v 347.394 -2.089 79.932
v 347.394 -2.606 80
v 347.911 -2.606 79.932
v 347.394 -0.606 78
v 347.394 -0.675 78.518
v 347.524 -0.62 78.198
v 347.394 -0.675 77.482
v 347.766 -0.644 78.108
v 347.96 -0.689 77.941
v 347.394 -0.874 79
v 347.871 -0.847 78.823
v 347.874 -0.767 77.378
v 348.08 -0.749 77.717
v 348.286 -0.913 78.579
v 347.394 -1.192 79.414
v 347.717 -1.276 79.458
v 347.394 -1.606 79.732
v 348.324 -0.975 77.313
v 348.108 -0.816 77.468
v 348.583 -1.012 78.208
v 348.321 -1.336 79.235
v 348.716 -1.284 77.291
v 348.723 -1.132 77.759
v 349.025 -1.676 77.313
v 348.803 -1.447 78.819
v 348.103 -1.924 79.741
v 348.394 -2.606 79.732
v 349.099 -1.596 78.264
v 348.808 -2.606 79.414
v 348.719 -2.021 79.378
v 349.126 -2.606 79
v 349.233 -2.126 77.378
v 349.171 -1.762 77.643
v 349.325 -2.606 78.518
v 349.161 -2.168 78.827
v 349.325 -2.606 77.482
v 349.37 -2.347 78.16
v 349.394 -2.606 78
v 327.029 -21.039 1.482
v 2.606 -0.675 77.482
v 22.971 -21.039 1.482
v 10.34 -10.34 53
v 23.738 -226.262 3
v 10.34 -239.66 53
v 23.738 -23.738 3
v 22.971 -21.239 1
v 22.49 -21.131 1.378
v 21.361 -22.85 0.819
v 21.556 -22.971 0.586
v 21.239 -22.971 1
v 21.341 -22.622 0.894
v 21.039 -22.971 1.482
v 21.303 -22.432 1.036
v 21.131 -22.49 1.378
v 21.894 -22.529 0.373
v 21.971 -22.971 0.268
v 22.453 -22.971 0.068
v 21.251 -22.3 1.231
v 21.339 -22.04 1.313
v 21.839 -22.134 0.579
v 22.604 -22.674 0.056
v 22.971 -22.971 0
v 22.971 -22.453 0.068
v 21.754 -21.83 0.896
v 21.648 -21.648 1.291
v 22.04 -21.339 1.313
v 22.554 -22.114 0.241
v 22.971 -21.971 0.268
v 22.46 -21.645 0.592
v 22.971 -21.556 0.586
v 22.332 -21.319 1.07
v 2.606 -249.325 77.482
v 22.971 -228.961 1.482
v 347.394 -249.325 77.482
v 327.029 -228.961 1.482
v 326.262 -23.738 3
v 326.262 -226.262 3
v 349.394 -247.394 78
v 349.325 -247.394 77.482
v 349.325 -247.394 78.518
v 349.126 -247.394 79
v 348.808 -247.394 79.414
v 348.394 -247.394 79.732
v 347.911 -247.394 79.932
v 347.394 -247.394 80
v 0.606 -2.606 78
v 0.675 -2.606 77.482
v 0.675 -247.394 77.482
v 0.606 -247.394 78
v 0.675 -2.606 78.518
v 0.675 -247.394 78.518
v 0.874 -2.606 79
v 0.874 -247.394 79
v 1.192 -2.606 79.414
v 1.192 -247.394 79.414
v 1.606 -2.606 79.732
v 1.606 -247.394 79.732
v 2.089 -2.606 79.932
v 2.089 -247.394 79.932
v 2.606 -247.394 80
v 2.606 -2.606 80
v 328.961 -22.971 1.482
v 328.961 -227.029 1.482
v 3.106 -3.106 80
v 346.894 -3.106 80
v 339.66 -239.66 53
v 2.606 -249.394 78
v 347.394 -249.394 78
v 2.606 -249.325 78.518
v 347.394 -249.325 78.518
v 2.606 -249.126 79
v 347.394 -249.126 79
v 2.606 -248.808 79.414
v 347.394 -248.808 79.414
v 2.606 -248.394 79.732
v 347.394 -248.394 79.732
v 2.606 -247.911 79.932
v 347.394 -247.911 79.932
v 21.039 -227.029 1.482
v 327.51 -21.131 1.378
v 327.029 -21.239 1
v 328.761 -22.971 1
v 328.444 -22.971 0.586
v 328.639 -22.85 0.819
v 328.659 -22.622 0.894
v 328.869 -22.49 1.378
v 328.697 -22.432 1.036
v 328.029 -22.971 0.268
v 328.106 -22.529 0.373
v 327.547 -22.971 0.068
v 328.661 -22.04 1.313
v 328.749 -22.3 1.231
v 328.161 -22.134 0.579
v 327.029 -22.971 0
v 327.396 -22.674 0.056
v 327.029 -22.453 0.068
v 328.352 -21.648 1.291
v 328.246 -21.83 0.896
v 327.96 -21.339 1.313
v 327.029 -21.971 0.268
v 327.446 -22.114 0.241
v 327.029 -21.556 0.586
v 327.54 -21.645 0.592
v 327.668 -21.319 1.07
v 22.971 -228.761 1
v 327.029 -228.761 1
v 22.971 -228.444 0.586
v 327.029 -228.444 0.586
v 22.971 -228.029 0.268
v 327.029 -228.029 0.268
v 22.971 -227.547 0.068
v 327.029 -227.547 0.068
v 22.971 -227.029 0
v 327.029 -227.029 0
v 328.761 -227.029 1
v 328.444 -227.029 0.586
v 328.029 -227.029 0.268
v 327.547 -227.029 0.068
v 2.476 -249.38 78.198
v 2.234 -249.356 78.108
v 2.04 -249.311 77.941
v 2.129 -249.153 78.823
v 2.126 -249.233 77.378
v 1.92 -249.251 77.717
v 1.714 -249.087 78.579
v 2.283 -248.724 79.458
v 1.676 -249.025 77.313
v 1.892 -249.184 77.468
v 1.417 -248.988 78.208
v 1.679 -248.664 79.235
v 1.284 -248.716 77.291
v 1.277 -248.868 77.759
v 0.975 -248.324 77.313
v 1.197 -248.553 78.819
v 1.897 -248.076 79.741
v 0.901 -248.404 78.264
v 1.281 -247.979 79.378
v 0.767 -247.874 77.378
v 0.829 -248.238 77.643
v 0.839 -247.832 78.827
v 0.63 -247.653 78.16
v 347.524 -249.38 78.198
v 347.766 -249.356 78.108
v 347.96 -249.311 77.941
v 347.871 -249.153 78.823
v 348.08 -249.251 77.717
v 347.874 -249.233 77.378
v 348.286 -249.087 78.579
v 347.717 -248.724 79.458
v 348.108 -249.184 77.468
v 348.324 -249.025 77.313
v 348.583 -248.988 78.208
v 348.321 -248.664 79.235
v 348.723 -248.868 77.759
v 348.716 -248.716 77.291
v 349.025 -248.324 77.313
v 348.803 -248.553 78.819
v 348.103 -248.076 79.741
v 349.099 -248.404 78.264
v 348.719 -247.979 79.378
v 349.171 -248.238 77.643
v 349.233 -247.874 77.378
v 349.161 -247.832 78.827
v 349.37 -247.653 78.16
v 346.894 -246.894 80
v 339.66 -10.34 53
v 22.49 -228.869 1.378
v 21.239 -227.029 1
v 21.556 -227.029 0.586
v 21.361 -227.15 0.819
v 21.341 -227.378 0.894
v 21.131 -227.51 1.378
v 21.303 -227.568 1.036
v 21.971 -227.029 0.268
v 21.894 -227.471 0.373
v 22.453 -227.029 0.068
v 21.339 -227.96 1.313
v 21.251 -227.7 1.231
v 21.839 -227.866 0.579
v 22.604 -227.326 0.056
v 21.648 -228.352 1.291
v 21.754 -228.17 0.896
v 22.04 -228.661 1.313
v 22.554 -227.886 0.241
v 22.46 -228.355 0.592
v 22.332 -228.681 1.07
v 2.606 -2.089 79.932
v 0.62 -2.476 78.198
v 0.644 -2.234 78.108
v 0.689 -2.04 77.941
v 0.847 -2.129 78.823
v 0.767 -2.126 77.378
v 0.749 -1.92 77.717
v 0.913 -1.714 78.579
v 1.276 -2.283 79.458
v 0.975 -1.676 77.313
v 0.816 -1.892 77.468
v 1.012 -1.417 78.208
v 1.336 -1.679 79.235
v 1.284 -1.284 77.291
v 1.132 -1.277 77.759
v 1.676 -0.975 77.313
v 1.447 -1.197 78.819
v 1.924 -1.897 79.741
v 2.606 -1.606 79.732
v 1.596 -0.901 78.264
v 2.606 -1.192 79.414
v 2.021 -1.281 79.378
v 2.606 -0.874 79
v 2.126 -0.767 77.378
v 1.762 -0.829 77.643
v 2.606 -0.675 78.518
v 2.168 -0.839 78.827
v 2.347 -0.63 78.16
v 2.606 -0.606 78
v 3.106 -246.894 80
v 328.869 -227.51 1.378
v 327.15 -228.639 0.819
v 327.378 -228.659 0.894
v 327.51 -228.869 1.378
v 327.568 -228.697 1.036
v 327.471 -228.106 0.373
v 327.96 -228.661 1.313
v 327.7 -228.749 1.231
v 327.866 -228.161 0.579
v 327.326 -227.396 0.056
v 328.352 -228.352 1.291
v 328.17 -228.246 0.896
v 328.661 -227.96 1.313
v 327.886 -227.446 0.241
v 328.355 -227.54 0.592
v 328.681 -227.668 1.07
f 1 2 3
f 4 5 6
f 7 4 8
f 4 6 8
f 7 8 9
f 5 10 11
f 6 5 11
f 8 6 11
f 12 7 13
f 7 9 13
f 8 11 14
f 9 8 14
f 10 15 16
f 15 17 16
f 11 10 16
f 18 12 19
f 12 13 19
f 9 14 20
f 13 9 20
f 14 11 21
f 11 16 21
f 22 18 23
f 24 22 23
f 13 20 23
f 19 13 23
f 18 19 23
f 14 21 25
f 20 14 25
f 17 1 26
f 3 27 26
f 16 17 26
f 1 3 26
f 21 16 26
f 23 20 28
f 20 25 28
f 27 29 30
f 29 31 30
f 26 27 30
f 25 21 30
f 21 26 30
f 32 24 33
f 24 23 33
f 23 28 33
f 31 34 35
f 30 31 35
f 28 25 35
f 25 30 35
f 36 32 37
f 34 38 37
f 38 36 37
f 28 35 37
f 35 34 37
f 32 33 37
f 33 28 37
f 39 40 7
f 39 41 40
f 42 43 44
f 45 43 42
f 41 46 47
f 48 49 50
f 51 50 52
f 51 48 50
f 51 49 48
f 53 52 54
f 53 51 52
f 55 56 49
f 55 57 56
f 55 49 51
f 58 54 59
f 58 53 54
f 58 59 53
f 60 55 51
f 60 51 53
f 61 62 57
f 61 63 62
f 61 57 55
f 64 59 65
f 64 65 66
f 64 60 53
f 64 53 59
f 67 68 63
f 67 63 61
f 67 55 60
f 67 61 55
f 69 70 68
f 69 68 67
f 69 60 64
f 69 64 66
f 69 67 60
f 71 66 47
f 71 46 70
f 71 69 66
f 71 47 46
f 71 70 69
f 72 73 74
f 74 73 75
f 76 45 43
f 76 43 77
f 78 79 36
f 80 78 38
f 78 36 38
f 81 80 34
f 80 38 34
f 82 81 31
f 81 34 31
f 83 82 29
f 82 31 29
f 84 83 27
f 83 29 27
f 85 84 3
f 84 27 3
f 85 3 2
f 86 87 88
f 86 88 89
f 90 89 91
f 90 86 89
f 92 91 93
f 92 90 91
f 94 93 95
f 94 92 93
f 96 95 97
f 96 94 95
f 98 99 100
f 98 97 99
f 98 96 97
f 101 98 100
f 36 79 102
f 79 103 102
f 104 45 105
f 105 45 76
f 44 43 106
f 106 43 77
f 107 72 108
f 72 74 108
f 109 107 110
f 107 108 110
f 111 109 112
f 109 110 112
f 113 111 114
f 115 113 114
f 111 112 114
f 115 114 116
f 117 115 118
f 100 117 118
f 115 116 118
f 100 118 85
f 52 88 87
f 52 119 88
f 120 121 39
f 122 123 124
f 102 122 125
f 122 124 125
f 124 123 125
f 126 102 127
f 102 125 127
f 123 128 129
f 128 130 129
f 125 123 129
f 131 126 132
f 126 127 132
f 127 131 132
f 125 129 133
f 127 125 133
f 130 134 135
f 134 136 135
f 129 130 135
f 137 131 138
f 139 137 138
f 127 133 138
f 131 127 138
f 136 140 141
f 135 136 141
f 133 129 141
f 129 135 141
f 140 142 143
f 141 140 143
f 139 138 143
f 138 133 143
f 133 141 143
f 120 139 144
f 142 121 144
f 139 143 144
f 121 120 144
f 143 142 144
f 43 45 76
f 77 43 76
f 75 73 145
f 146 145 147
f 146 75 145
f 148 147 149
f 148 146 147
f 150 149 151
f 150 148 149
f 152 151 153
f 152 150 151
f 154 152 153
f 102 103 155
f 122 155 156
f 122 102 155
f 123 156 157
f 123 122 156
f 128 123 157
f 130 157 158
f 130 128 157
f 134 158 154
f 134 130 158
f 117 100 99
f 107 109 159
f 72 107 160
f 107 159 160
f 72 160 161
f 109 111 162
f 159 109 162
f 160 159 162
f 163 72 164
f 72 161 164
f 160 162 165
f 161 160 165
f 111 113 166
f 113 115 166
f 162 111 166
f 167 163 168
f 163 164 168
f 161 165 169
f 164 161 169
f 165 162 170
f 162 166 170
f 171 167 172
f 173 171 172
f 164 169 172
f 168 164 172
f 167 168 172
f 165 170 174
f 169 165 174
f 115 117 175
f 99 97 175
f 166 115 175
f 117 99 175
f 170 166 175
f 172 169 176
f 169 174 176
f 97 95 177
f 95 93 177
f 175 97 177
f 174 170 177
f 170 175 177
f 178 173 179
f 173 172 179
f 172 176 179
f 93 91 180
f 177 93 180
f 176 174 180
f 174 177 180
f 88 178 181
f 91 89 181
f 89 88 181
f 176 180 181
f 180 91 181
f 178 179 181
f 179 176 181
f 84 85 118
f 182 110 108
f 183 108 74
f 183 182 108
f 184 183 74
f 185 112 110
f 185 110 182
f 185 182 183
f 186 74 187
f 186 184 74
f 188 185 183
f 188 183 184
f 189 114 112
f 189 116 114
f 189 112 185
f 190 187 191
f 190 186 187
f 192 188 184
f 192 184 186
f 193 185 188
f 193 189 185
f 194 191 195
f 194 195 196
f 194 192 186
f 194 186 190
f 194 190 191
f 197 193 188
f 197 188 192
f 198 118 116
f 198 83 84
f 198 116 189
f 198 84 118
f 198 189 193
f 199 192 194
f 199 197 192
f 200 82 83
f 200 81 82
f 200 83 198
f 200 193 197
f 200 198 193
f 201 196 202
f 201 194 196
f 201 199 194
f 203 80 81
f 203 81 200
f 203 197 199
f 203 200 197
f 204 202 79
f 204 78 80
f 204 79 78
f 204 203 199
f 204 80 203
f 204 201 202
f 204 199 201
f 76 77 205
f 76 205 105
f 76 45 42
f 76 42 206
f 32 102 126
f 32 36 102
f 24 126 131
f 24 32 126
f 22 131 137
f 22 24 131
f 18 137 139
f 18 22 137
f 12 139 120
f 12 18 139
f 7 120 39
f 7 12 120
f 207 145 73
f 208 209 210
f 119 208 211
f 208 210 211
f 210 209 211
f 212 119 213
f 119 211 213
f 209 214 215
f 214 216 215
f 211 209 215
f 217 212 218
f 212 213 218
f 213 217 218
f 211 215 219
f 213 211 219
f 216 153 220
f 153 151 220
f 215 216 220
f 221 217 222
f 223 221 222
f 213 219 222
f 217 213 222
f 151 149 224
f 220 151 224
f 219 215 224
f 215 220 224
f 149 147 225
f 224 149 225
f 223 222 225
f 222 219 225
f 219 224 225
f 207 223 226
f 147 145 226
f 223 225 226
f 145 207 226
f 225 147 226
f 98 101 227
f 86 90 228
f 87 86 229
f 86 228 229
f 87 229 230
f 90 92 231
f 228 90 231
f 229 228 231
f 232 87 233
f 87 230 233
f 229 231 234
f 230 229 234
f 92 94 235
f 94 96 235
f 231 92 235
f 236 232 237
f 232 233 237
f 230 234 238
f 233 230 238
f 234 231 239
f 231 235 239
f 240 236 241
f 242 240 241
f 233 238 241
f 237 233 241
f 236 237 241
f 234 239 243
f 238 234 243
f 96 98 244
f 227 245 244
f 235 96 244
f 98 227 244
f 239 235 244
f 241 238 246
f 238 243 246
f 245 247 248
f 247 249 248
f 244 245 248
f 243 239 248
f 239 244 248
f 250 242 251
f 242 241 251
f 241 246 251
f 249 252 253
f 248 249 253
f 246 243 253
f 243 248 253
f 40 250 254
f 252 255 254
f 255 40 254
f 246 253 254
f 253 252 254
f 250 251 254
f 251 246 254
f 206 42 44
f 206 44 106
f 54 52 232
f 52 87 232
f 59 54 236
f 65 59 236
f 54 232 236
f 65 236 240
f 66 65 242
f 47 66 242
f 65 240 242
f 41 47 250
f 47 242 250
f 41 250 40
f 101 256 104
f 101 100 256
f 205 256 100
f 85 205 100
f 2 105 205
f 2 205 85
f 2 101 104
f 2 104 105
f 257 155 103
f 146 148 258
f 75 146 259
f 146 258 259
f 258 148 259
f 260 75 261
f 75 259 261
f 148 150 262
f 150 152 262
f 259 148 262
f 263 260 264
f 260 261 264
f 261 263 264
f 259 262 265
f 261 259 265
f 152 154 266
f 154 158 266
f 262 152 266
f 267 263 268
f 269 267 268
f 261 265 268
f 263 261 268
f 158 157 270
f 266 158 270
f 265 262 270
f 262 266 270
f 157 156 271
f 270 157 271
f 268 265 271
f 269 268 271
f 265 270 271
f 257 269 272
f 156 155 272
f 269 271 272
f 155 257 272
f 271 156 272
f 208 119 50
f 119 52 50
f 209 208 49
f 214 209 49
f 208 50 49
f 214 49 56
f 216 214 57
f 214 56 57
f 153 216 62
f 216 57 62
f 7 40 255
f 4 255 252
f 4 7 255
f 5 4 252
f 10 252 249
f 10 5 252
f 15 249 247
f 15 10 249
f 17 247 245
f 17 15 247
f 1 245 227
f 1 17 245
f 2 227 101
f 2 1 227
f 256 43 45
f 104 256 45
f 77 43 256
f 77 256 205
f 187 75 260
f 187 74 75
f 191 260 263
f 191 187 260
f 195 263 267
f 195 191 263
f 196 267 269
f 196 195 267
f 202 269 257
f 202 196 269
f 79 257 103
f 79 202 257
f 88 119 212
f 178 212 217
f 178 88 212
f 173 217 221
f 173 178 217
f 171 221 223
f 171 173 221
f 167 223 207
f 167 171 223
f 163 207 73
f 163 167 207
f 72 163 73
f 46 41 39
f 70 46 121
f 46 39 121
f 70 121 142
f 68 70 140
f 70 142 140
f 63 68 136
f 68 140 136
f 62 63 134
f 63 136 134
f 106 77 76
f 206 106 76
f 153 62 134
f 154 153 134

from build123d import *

# Parameters (mm, degrees)
SKETCH_1_W        = 350
SKETCH_1_H        = 250
EXTRUDE_1_DEPTH   = 80
DRAFT_3_ANGLE     = -15
FILLET_1_R        = 2
SHELL_8_OUTLINE_W = 302.524167284
SHELL_8_OUTLINE_H = 202.524167284
SHELL_8_DEPTH     = 77
SHELL_8_DRAFT     = -15
SKETCH_4_W        = 302.524167284
SKETCH_4_H        = 202.524167284
EXTRUDE_3_DEPTH   = 50
EXTRUDE_3_DRAFT   = -15


# Read off the part's stored shape, not the designer's step: 쉘8
with BuildPart() as part:
    # 스케치1 → 보스-돌출1 (new body)
    with BuildSketch(Plane.XY):
        with Locations((175, -125)):
            Rectangle(SKETCH_1_W, SKETCH_1_H)
    extrude(amount=EXTRUDE_1_DEPTH)

    # 구배3
    draft_3_faces = [part.faces().sort_by_distance(p)[0] for p in [
        (350, -125, 40),
        (175, -250, 40),
        (0, -125, 40),
        (175, 0, 40),
    ]]
    draft(draft_3_faces, Plane.XY.offset(80), DRAFT_3_ANGLE)

    # 필렛1
    fillet_1_edges = [part.edges().sort_by_distance(p)[0] for p in [
        (350, -125, 80),
        (175, 0, 80),
        (0, -125, 80),
        (175, -21.435935394, 0),
        (328.564064606, -125, 0),
        (175, -228.564064606, 0),
        (21.435935394, -125, 0),
        (175, -250, 80),
        (10.717967697, -10.717967697, 40),
        (339.282032303, -10.717967697, 40),
        (339.282032303, -239.282032303, 40),
        (10.717967697, -239.282032303, 40),
    ]]
    fillet(fillet_1_edges, radius=FILLET_1_R)


with BuildPart() as shell_8_tool:
    # 쉘8 outline → 쉘8 (with draft: the straight prism first)
    with BuildSketch(Plane.XY.offset(3)):
        with Locations((175, -125)):
            Rectangle(SHELL_8_OUTLINE_W, SHELL_8_OUTLINE_H)
    extrude(amount=SHELL_8_DEPTH)
    # 쉘8: the draft: its side faces are tilted about the plane it starts from
    shell_8_sides = [shell_8_tool.faces().sort_by_distance(p)[0] for p in [
        (175, -226.262083642, 41.5),
        (326.262083642, -125, 41.5),
        (175, -23.737916358, 41.5),
        (23.737916358, -125, 41.5),
    ]]
    draft(shell_8_sides, Plane.XY.offset(3), SHELL_8_DRAFT)


with BuildPart() as part_1:
    add(part.part)

    # 쉘8: cut by shell_8_tool
    add(shell_8_tool.part, mode=Mode.SUBTRACT)


with BuildPart() as body_2:
    # 스케치4 → 보스-돌출3 (with draft: the straight prism first)
    with BuildSketch(Plane.XY.offset(3)):
        with Locations((175, -125)):
            Rectangle(SKETCH_4_W, SKETCH_4_H)
    extrude(amount=EXTRUDE_3_DEPTH)
    # 보스-돌출3: the draft: its side faces are tilted about the plane it starts from
    extrude_3_sides = [body_2.faces().sort_by_distance(p)[0] for p in [
        (326.262083642, -125, 28),
        (175, -23.737916358, 28),
        (23.737916358, -125, 28),
        (175, -226.262083642, 28),
    ]]
    draft(extrude_3_sides, Plane.XY.offset(3), EXTRUDE_3_DRAFT)


solid = Compound([part_1.part, body_2.part])
